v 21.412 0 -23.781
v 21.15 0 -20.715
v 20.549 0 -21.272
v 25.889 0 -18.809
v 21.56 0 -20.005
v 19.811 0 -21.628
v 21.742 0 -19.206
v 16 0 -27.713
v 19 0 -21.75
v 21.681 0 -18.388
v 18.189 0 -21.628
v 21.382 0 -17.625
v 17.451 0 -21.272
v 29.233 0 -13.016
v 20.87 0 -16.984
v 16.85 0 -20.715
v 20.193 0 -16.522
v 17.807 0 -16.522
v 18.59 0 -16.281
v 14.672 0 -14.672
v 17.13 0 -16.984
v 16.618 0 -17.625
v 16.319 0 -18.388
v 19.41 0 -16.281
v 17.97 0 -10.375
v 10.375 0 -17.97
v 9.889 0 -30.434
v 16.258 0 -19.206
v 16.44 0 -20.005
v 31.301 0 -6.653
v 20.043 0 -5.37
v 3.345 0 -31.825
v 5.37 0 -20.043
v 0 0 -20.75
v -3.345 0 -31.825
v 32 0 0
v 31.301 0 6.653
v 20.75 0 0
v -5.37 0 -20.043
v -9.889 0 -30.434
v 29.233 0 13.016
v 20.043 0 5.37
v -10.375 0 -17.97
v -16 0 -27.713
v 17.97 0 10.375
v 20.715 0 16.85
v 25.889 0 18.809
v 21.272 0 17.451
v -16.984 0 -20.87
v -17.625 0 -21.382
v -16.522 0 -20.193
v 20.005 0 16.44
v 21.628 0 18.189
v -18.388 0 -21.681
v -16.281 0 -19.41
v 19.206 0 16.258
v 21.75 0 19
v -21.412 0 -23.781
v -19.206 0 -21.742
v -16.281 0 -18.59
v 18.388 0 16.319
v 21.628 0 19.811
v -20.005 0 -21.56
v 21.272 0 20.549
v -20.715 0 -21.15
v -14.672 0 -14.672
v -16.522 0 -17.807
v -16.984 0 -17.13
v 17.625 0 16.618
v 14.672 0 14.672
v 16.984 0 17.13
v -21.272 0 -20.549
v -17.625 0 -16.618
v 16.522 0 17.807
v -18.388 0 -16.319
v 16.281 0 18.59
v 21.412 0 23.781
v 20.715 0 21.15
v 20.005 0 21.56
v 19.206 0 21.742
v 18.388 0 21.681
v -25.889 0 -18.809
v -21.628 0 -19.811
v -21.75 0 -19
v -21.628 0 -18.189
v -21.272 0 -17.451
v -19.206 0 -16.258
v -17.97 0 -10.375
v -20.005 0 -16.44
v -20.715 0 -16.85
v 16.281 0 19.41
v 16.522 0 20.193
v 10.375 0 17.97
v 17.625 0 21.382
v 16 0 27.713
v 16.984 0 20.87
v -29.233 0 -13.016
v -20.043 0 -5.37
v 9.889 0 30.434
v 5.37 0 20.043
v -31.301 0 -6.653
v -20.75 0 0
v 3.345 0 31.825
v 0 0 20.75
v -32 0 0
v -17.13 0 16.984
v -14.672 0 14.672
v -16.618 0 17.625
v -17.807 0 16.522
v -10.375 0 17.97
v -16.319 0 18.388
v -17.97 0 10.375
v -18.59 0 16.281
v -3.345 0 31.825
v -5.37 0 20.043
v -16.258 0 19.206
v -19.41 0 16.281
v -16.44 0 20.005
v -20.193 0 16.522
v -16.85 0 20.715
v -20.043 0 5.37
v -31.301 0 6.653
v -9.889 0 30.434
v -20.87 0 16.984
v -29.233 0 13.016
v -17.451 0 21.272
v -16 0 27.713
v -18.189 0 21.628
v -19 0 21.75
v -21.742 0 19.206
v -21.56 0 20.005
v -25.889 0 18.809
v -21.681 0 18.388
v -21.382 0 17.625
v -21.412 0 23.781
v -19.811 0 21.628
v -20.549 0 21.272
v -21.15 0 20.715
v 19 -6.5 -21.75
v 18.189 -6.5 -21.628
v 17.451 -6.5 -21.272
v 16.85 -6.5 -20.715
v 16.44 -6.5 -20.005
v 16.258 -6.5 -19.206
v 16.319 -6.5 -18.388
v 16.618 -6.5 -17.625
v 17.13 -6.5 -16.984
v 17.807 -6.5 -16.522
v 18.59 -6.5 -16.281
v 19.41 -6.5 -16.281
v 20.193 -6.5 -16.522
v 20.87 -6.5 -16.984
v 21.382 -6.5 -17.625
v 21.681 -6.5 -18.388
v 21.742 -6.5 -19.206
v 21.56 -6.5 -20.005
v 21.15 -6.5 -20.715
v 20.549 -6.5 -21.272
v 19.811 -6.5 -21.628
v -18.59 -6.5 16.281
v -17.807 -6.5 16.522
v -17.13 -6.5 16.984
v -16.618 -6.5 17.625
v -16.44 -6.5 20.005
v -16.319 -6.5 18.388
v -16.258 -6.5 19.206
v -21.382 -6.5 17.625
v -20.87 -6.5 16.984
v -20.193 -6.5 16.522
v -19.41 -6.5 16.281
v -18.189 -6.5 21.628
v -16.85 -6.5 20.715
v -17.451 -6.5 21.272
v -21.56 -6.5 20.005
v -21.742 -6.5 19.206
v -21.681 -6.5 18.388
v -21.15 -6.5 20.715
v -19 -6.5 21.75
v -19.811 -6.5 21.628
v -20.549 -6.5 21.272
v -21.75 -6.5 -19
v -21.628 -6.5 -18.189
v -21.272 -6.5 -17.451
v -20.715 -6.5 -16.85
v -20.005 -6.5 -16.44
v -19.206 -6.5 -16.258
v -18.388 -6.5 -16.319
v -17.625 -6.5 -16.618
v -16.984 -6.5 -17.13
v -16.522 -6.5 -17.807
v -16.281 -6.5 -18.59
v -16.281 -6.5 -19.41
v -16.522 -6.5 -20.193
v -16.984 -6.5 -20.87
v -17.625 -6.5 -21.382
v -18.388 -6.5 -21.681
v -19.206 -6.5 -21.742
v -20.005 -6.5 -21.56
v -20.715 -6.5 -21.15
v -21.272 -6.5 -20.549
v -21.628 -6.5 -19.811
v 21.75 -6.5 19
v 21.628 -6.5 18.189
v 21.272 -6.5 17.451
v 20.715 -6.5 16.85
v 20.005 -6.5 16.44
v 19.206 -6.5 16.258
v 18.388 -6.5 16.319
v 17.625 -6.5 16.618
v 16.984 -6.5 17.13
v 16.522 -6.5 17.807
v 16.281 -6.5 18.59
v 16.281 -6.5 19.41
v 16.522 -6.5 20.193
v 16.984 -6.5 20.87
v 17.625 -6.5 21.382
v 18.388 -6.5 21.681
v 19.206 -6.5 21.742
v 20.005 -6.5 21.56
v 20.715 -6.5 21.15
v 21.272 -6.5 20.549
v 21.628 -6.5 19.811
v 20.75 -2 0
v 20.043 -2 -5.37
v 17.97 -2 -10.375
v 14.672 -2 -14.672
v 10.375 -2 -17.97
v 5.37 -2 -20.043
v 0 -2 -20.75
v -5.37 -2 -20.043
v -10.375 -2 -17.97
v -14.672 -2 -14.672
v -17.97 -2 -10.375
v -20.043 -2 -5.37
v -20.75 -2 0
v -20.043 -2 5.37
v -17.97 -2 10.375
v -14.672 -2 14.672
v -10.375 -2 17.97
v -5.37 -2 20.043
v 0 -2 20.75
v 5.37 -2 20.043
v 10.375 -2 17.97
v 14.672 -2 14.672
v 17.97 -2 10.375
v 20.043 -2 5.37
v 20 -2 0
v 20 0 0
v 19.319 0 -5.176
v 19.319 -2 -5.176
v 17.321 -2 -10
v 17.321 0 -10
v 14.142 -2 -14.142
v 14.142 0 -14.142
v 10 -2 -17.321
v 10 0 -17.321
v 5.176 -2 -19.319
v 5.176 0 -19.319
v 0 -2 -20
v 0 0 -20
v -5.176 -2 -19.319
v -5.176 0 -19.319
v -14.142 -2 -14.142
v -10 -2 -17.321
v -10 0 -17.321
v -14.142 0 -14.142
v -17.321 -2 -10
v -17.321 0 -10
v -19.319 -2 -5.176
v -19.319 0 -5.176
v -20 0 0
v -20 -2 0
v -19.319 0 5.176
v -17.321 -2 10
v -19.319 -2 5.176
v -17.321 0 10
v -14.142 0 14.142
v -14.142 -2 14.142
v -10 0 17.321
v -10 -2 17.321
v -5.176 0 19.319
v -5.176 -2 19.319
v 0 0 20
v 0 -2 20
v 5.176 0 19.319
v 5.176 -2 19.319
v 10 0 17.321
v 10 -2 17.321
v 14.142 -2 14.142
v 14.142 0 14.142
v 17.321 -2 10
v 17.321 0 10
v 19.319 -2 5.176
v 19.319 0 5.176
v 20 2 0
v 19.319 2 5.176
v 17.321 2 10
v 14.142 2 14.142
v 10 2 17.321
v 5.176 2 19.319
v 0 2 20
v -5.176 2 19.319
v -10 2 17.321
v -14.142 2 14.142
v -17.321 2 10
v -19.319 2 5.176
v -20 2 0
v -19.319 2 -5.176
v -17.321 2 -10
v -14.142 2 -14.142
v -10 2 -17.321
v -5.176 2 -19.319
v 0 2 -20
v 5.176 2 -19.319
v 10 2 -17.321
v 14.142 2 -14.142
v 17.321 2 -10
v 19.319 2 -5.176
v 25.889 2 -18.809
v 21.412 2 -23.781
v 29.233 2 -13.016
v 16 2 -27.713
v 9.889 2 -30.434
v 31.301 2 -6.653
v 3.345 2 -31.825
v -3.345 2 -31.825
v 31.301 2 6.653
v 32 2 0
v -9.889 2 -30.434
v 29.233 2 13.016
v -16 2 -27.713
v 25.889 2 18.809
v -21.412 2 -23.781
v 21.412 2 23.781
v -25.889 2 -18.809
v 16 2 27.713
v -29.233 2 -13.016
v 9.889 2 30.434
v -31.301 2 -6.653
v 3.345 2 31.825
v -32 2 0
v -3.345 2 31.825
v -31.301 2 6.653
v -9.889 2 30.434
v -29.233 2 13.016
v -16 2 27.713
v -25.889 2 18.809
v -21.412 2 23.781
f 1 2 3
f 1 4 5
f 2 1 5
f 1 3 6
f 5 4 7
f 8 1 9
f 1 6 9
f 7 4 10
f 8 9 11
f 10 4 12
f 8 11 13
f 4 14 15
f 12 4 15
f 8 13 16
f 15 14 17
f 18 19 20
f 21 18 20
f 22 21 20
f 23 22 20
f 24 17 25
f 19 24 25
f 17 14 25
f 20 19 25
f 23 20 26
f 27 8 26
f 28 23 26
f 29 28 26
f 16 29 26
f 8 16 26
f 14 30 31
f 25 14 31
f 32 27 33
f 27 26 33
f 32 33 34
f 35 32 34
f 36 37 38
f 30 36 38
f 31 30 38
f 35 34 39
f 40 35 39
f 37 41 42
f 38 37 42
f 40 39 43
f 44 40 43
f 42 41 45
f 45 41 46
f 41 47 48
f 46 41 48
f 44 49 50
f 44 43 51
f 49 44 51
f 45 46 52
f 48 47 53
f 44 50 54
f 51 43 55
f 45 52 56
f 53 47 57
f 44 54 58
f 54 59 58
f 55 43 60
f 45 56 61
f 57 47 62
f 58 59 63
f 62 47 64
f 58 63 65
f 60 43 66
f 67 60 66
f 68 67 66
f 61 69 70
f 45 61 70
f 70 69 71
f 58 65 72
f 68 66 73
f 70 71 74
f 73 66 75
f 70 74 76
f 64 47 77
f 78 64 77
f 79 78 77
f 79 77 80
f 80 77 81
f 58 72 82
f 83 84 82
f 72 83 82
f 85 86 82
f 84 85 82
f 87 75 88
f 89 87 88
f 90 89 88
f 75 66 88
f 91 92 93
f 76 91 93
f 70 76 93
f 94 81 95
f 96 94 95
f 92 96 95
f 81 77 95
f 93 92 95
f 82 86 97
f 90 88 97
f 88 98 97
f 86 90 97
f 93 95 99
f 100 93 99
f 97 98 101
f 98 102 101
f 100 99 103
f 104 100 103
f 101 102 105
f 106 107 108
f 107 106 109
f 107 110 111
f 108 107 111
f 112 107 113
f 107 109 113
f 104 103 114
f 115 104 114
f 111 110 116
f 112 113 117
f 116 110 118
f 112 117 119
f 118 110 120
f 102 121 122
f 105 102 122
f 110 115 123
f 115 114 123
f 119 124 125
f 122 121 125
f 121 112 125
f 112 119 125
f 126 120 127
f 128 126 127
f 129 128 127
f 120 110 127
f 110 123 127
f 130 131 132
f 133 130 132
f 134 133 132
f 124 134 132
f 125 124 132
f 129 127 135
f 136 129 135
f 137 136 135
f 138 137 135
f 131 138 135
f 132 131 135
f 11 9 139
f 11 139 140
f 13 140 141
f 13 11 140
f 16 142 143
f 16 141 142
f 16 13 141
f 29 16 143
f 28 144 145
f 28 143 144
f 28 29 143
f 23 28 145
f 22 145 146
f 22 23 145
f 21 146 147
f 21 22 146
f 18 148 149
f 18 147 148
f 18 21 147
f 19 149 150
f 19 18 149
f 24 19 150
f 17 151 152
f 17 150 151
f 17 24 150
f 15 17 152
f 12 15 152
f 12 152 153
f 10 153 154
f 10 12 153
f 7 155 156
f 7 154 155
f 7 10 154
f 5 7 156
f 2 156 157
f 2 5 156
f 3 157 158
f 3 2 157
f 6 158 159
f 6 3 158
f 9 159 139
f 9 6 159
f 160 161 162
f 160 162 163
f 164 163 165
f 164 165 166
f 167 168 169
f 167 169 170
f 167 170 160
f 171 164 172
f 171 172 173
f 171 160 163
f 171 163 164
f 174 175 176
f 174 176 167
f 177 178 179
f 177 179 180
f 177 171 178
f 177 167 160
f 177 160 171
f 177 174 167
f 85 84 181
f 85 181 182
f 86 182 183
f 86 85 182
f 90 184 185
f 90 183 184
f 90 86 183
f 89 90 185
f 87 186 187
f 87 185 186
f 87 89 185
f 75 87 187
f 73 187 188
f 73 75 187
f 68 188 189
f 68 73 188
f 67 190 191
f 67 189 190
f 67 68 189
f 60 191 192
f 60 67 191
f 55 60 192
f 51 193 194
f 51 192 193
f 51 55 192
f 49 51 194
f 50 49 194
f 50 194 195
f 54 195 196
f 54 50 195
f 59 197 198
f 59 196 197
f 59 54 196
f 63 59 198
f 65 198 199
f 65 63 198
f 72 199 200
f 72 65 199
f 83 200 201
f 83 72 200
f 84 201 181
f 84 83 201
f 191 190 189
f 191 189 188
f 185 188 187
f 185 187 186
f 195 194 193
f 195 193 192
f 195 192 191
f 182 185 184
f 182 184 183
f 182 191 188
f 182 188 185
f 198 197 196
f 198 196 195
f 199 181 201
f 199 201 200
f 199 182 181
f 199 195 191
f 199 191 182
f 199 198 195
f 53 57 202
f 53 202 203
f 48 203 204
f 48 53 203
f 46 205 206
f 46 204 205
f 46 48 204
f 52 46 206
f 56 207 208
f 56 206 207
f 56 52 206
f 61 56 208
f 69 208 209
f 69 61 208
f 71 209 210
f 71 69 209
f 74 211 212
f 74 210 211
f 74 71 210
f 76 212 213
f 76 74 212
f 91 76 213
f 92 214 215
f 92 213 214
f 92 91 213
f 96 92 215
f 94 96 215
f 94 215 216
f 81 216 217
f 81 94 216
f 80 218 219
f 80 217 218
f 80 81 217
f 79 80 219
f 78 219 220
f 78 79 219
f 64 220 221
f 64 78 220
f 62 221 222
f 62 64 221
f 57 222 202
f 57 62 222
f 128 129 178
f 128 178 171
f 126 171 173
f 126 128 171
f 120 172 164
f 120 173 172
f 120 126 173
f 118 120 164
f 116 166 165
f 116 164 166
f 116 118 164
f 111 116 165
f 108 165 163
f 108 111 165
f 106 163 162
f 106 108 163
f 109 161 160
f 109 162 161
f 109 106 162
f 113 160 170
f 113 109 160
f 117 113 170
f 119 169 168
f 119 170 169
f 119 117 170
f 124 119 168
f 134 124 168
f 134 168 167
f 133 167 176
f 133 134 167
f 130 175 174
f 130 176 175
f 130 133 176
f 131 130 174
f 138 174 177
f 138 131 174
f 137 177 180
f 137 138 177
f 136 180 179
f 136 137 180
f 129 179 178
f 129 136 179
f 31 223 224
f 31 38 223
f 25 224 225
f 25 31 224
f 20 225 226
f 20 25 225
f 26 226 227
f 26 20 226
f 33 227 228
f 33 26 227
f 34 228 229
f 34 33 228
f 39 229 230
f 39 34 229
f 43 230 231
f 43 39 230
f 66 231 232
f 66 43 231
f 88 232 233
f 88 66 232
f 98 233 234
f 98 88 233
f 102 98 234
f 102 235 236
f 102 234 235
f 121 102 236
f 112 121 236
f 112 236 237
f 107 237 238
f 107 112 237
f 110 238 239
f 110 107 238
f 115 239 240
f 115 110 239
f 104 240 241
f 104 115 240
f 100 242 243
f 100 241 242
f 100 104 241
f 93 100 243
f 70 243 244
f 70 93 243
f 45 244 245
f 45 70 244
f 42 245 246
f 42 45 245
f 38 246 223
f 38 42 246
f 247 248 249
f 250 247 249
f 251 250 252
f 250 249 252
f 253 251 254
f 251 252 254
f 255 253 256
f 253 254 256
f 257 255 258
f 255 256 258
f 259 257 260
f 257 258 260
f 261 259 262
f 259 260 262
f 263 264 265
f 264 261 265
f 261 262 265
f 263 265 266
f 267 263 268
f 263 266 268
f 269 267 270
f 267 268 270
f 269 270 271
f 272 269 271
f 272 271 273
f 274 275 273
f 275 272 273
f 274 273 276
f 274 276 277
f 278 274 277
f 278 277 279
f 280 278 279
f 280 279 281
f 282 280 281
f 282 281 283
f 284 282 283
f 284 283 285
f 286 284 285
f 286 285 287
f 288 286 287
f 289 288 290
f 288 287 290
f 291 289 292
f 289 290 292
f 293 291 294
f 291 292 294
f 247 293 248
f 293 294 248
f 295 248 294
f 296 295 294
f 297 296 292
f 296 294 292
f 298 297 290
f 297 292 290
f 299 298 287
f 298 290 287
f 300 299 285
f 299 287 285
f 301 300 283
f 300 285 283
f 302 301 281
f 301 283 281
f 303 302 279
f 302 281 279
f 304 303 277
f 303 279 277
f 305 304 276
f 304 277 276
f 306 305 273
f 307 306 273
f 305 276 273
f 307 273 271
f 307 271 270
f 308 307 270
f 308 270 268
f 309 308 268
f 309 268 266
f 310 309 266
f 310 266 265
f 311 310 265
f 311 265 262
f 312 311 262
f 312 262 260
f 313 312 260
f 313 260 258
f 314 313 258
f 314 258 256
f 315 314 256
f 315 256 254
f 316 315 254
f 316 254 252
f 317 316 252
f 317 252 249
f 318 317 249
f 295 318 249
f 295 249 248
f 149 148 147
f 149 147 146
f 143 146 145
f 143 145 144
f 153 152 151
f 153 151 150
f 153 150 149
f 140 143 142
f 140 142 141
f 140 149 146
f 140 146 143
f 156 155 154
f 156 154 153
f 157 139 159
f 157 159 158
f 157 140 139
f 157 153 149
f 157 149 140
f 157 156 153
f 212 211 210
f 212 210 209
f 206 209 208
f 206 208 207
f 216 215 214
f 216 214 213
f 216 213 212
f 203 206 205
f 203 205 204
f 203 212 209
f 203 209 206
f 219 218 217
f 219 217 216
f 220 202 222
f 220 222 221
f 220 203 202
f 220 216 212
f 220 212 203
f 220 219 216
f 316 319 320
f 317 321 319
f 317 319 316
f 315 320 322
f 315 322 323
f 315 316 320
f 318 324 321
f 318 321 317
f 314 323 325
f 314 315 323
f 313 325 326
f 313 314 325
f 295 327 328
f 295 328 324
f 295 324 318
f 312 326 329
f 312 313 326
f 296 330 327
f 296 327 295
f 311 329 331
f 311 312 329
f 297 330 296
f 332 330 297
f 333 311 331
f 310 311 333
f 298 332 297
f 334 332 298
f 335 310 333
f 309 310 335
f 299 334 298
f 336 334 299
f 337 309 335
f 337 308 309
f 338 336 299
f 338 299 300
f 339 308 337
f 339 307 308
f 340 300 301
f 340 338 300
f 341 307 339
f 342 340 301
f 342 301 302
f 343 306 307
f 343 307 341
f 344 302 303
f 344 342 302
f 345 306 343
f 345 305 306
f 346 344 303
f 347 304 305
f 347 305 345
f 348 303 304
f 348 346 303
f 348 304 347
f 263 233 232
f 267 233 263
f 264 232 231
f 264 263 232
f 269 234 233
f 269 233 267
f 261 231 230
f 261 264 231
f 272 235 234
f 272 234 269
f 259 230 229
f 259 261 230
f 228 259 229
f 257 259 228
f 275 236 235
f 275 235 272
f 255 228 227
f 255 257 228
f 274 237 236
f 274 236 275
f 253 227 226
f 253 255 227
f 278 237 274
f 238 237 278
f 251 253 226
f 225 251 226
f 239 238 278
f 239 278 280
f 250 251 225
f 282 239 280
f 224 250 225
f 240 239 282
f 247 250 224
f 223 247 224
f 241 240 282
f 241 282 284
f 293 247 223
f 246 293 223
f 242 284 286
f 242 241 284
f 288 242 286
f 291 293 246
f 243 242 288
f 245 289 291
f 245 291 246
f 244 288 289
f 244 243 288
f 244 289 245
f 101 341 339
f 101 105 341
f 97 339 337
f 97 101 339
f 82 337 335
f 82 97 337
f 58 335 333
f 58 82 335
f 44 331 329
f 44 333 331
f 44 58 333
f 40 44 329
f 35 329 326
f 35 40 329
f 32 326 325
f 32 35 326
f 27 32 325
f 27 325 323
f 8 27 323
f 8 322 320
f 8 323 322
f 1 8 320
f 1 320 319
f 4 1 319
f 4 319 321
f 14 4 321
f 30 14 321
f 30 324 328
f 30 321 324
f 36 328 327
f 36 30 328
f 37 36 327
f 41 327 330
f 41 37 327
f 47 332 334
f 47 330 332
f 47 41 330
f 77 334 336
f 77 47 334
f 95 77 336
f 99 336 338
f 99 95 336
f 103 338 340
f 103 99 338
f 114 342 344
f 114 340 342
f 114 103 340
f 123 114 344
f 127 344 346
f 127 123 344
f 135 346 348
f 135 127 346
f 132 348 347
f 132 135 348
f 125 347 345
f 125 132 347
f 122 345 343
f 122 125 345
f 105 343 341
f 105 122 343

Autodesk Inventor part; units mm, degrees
ref_plane "YZ Plane" through (0, 0, 0) normal (1, 0, 0) x (0, 1, 0)
ref_plane "XZ Plane" through (0, 0, 0) normal (0, 1, 0) x (-1, 0, 0)
ref_plane "XY Plane" through (0, 0, 0) normal (0, 0, 1) x (1, 0, 0)
sketch "Sketch1" plane through (0, 0, 0) normal (0, 1, 0) x (-1, 0, 0)
  circle A0 centre (0, 0) radius 32
  dimension "d0" = 64
extrude "Extrusion1" add sketch "Sketch1" along normal blind 2
sketch "Sketch2" plane through (0, 0, 0) normal (0, -1, 0) x (1, 0, 0)
  circle A0 centre (0, 0) radius 20.75
  circle A1 centre (0, 0) radius 20
  dimension "d3" = 41.5
  dimension "d4" = 40
extrude "Extrusion2" add sketch "Sketch2" along normal blind 2
sketch "Sketch3" plane through (0, 0, 0) normal (0, -1, 0) x (1, 0, 0)
  circle A0 centre (0, 0) radius 20 projected
extrude "Extrusion3" cut sketch "Sketch3" against normal blind 2
sketch "Sketch4" plane through (0, 0, 0) normal (0, -1, 0) x (1, 0, 0)
  circle A0 centre (19, 19) radius 2.75
  point P0 (0, 0)
  dimension "d9" = 5.5
  dimension "d10" = 19
  dimension "d11" = 19
extrude "Extrusion4" add sketch "Sketch4" along normal blind 6.5
pattern_circular "Circular Pattern1" count 4 over 360 about axis through (0, -10, 0) along (0, 1, 0) of "Extrusion4"
properties part number "pot_base_adapter1"
